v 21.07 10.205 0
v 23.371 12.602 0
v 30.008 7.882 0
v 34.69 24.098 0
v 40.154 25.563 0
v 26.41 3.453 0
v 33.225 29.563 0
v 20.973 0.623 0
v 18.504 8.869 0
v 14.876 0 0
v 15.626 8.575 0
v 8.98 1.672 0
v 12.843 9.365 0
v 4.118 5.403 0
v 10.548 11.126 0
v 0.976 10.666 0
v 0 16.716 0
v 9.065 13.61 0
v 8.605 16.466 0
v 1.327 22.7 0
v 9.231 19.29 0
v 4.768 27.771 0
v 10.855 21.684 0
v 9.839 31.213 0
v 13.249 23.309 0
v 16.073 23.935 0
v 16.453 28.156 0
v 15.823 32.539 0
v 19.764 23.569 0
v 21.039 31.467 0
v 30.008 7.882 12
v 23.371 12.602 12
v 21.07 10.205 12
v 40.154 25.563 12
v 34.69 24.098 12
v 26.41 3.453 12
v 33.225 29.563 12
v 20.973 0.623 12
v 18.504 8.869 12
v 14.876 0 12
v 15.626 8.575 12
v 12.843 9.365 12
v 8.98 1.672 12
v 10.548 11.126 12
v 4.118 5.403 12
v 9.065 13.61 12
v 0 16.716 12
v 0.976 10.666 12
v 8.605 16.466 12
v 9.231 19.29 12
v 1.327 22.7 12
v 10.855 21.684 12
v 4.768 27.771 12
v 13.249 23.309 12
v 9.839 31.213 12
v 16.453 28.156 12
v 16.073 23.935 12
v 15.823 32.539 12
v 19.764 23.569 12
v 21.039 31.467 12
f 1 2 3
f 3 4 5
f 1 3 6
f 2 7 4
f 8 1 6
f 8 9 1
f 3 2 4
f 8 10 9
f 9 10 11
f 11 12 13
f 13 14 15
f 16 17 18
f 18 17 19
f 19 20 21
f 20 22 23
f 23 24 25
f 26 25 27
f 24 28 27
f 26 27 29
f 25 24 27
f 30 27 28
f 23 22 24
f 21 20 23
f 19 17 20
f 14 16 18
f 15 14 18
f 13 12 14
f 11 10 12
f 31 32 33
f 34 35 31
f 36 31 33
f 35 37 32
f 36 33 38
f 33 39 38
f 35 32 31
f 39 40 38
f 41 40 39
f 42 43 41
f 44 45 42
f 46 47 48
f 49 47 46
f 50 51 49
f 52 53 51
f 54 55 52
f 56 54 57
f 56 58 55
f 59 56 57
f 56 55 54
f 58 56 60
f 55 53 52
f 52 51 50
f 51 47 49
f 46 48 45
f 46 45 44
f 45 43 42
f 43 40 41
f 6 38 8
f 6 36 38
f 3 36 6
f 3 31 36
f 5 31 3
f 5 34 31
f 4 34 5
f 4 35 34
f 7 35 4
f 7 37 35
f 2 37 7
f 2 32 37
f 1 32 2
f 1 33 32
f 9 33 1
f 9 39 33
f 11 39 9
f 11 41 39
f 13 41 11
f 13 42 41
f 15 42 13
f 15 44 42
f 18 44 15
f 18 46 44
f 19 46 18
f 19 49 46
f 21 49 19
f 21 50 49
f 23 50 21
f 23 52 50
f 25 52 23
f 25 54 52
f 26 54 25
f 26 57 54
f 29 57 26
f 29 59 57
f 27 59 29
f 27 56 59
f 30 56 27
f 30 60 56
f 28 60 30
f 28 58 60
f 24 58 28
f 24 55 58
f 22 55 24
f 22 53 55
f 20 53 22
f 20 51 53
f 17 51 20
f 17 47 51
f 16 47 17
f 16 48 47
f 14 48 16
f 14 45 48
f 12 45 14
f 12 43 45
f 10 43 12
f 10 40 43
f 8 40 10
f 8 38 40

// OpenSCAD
$fn = 32;

// ----------------------------------------------------------------------
// Eye lug: ring_tail, 12 mm thick
// ----------------------------------------------------------------------

// --- parameters (mm) ---
profile_height = 12;      // extrusion height
profile_points = 30;      // points of the closed outline

profile = [[16.453, 28.156], [21.039, 31.467], [15.823, 32.539], [9.839, 31.213], [4.768, 27.771], [1.327, 22.7], [0, 16.716], [0.976, 10.666], [4.118, 5.403], [8.98, 1.672], [14.876, 0], [20.973, 0.623], [26.41, 3.453], [30.008, 7.882], [40.154, 25.563], [34.69, 24.098], [33.225, 29.563], [23.371, 12.602], [21.07, 10.205], [18.504, 8.869], [15.626, 8.575], [12.843, 9.365], [10.548, 11.126], [9.065, 13.61], [8.605, 16.466], [9.231, 19.29], [10.855, 21.684], [13.249, 23.309], [16.073, 23.935], [19.764, 23.569]];  // single closed polygon, 30 points, counter clockwise

// --- the one profile operation ---
linear_extrude(height = profile_height) polygon(points = profile);
